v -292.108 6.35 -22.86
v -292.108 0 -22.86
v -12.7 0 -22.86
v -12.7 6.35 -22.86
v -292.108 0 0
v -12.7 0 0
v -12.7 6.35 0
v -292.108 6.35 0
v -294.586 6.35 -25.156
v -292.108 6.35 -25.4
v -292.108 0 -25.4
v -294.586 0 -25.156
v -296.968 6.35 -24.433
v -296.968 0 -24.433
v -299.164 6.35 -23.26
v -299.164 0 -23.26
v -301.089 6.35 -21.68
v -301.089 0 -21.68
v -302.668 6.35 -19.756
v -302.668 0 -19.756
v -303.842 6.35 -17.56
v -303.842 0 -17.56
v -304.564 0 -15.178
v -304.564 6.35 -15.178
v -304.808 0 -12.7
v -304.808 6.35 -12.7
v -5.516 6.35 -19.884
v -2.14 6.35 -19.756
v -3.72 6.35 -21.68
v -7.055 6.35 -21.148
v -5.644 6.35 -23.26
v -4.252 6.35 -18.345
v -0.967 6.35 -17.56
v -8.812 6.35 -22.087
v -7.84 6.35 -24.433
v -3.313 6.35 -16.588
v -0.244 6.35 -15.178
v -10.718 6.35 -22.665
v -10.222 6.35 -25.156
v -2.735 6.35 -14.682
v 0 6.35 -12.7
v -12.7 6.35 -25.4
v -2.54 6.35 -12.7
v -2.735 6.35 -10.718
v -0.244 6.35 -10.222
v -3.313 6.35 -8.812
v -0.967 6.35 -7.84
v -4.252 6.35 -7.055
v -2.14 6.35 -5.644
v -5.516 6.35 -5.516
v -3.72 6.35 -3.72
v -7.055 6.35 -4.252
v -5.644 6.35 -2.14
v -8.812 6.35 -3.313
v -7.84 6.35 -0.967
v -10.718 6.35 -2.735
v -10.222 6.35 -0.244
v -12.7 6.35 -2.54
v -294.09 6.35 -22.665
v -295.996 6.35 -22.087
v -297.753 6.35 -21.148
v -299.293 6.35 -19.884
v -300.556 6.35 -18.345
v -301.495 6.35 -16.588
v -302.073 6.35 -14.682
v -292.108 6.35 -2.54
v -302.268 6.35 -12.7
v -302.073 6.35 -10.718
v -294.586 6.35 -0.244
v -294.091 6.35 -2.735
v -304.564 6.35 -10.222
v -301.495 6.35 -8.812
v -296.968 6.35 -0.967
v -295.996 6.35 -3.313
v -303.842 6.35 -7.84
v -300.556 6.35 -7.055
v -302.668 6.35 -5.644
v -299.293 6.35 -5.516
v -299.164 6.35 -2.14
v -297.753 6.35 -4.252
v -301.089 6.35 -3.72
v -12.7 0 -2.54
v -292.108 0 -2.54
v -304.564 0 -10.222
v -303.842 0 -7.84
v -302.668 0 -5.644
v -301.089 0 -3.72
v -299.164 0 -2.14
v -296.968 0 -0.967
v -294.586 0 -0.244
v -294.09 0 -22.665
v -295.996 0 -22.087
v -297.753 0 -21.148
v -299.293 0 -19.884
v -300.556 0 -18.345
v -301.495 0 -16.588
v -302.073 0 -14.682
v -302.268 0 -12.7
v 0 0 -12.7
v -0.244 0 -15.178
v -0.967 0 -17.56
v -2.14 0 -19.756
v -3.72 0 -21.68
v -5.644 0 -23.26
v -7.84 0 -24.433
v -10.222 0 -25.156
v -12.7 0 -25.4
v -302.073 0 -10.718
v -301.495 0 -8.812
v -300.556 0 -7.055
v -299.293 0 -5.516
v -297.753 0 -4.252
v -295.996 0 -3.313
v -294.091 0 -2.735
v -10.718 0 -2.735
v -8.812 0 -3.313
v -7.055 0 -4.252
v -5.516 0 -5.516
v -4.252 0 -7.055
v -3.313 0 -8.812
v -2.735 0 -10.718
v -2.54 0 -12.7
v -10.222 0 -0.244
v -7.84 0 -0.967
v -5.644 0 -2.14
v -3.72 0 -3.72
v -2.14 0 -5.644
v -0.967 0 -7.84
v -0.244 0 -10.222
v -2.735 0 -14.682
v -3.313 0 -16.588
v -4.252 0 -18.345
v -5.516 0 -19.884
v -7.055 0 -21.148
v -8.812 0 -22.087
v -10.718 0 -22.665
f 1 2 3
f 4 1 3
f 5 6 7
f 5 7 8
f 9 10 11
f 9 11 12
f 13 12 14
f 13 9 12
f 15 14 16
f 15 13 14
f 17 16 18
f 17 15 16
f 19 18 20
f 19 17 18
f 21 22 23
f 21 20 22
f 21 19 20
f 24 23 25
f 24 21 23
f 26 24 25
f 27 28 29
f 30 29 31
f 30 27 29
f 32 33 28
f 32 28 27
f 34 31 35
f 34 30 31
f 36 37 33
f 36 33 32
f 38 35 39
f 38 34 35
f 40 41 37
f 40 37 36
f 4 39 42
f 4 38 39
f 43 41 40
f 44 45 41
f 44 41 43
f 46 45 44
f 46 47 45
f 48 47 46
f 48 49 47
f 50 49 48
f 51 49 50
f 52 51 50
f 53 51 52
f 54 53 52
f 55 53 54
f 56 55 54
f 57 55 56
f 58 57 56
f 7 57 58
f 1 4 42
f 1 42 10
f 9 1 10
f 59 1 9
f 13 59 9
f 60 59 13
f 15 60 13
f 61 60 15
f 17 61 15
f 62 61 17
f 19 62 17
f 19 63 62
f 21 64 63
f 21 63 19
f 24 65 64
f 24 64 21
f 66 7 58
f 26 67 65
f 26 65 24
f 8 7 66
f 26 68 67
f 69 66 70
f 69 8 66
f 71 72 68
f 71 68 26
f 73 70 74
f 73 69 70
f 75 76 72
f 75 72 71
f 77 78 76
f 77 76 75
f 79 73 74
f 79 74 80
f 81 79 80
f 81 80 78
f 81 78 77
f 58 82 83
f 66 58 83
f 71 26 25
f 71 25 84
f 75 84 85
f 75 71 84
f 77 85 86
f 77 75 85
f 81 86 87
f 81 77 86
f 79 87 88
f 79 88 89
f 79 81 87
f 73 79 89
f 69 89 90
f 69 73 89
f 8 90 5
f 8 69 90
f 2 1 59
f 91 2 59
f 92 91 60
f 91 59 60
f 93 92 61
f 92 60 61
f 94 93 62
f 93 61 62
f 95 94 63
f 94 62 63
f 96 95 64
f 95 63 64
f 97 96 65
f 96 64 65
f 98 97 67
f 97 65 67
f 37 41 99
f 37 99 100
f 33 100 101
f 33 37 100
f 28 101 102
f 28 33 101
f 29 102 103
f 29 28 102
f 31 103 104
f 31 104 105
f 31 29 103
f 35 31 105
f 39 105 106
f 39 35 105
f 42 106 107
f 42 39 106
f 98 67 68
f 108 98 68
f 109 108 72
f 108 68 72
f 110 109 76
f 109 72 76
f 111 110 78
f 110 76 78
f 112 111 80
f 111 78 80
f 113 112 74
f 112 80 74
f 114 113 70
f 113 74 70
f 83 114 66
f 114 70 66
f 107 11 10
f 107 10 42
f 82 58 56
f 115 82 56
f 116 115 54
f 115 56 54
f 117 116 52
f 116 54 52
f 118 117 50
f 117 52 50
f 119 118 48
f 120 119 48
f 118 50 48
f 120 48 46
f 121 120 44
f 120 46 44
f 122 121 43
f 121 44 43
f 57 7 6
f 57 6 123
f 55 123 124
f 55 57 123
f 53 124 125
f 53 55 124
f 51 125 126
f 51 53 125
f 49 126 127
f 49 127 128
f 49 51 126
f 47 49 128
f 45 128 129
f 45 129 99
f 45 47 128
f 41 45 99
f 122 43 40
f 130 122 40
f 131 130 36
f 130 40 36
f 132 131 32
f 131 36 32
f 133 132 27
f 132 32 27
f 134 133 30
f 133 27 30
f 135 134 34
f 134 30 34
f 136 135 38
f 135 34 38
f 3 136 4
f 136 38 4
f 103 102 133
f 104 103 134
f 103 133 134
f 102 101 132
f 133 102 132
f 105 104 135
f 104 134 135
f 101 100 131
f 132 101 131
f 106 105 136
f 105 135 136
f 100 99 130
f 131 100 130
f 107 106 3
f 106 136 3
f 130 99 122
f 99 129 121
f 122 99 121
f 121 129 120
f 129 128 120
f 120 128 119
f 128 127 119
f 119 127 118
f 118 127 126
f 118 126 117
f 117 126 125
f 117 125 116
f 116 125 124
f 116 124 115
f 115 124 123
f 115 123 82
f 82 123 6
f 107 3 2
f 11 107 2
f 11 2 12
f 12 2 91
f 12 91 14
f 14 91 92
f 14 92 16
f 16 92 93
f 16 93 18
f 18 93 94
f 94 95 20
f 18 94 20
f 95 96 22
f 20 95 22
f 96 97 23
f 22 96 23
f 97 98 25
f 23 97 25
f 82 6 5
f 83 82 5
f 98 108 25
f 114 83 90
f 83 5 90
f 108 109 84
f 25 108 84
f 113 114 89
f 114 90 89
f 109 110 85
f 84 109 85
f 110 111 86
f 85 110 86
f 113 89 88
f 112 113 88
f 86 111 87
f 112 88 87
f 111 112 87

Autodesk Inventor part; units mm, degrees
ref_plane "YZ Plane" through (0, 0, 0) normal (1, 0, 0) x (0, 1, 0)
ref_plane "XZ Plane" through (0, 0, 0) normal (0, 1, 0) x (-1, 0, 0)
ref_plane "XY Plane" through (0, 0, 0) normal (0, 0, 1) x (1, 0, 0)
sketch "Sketch1" plane through (0, 0, 0) normal (0, 1, 0) x (-1, 0, 0)
  line L0 (0, 0) -> (304.8083, 0)
  line L1 (304.8083, 0) -> (304.8083, -25.4)
  line L2 (304.8083, -25.4) -> (0, -25.4)
  line L3 (0, -25.4) -> (0, 0)
  dimension "d0" = 25.4
extrude "Extrusion1" add sketch "Sketch1" along normal blind 6.35
fillet "Fillet1" radius 12.7 1 edges at (-304.8083, 3.175, -25.4)
fillet "Fillet2" radius 12.7 1 edges at (-304.8083, 3.175, 0)
fillet "Fillet3" radius 12.7 1 edges at (0, 3.175, 0)
fillet "Fillet4" radius 12.7 1 edges at (0, 3.175, -25.4)
shell "Shell1" thickness 2.54 removed faces 2 at (-198.9723, 6.35, -8.4667) at (-198.9723, 0, -8.4667)
properties part number "LiftLineWire"
